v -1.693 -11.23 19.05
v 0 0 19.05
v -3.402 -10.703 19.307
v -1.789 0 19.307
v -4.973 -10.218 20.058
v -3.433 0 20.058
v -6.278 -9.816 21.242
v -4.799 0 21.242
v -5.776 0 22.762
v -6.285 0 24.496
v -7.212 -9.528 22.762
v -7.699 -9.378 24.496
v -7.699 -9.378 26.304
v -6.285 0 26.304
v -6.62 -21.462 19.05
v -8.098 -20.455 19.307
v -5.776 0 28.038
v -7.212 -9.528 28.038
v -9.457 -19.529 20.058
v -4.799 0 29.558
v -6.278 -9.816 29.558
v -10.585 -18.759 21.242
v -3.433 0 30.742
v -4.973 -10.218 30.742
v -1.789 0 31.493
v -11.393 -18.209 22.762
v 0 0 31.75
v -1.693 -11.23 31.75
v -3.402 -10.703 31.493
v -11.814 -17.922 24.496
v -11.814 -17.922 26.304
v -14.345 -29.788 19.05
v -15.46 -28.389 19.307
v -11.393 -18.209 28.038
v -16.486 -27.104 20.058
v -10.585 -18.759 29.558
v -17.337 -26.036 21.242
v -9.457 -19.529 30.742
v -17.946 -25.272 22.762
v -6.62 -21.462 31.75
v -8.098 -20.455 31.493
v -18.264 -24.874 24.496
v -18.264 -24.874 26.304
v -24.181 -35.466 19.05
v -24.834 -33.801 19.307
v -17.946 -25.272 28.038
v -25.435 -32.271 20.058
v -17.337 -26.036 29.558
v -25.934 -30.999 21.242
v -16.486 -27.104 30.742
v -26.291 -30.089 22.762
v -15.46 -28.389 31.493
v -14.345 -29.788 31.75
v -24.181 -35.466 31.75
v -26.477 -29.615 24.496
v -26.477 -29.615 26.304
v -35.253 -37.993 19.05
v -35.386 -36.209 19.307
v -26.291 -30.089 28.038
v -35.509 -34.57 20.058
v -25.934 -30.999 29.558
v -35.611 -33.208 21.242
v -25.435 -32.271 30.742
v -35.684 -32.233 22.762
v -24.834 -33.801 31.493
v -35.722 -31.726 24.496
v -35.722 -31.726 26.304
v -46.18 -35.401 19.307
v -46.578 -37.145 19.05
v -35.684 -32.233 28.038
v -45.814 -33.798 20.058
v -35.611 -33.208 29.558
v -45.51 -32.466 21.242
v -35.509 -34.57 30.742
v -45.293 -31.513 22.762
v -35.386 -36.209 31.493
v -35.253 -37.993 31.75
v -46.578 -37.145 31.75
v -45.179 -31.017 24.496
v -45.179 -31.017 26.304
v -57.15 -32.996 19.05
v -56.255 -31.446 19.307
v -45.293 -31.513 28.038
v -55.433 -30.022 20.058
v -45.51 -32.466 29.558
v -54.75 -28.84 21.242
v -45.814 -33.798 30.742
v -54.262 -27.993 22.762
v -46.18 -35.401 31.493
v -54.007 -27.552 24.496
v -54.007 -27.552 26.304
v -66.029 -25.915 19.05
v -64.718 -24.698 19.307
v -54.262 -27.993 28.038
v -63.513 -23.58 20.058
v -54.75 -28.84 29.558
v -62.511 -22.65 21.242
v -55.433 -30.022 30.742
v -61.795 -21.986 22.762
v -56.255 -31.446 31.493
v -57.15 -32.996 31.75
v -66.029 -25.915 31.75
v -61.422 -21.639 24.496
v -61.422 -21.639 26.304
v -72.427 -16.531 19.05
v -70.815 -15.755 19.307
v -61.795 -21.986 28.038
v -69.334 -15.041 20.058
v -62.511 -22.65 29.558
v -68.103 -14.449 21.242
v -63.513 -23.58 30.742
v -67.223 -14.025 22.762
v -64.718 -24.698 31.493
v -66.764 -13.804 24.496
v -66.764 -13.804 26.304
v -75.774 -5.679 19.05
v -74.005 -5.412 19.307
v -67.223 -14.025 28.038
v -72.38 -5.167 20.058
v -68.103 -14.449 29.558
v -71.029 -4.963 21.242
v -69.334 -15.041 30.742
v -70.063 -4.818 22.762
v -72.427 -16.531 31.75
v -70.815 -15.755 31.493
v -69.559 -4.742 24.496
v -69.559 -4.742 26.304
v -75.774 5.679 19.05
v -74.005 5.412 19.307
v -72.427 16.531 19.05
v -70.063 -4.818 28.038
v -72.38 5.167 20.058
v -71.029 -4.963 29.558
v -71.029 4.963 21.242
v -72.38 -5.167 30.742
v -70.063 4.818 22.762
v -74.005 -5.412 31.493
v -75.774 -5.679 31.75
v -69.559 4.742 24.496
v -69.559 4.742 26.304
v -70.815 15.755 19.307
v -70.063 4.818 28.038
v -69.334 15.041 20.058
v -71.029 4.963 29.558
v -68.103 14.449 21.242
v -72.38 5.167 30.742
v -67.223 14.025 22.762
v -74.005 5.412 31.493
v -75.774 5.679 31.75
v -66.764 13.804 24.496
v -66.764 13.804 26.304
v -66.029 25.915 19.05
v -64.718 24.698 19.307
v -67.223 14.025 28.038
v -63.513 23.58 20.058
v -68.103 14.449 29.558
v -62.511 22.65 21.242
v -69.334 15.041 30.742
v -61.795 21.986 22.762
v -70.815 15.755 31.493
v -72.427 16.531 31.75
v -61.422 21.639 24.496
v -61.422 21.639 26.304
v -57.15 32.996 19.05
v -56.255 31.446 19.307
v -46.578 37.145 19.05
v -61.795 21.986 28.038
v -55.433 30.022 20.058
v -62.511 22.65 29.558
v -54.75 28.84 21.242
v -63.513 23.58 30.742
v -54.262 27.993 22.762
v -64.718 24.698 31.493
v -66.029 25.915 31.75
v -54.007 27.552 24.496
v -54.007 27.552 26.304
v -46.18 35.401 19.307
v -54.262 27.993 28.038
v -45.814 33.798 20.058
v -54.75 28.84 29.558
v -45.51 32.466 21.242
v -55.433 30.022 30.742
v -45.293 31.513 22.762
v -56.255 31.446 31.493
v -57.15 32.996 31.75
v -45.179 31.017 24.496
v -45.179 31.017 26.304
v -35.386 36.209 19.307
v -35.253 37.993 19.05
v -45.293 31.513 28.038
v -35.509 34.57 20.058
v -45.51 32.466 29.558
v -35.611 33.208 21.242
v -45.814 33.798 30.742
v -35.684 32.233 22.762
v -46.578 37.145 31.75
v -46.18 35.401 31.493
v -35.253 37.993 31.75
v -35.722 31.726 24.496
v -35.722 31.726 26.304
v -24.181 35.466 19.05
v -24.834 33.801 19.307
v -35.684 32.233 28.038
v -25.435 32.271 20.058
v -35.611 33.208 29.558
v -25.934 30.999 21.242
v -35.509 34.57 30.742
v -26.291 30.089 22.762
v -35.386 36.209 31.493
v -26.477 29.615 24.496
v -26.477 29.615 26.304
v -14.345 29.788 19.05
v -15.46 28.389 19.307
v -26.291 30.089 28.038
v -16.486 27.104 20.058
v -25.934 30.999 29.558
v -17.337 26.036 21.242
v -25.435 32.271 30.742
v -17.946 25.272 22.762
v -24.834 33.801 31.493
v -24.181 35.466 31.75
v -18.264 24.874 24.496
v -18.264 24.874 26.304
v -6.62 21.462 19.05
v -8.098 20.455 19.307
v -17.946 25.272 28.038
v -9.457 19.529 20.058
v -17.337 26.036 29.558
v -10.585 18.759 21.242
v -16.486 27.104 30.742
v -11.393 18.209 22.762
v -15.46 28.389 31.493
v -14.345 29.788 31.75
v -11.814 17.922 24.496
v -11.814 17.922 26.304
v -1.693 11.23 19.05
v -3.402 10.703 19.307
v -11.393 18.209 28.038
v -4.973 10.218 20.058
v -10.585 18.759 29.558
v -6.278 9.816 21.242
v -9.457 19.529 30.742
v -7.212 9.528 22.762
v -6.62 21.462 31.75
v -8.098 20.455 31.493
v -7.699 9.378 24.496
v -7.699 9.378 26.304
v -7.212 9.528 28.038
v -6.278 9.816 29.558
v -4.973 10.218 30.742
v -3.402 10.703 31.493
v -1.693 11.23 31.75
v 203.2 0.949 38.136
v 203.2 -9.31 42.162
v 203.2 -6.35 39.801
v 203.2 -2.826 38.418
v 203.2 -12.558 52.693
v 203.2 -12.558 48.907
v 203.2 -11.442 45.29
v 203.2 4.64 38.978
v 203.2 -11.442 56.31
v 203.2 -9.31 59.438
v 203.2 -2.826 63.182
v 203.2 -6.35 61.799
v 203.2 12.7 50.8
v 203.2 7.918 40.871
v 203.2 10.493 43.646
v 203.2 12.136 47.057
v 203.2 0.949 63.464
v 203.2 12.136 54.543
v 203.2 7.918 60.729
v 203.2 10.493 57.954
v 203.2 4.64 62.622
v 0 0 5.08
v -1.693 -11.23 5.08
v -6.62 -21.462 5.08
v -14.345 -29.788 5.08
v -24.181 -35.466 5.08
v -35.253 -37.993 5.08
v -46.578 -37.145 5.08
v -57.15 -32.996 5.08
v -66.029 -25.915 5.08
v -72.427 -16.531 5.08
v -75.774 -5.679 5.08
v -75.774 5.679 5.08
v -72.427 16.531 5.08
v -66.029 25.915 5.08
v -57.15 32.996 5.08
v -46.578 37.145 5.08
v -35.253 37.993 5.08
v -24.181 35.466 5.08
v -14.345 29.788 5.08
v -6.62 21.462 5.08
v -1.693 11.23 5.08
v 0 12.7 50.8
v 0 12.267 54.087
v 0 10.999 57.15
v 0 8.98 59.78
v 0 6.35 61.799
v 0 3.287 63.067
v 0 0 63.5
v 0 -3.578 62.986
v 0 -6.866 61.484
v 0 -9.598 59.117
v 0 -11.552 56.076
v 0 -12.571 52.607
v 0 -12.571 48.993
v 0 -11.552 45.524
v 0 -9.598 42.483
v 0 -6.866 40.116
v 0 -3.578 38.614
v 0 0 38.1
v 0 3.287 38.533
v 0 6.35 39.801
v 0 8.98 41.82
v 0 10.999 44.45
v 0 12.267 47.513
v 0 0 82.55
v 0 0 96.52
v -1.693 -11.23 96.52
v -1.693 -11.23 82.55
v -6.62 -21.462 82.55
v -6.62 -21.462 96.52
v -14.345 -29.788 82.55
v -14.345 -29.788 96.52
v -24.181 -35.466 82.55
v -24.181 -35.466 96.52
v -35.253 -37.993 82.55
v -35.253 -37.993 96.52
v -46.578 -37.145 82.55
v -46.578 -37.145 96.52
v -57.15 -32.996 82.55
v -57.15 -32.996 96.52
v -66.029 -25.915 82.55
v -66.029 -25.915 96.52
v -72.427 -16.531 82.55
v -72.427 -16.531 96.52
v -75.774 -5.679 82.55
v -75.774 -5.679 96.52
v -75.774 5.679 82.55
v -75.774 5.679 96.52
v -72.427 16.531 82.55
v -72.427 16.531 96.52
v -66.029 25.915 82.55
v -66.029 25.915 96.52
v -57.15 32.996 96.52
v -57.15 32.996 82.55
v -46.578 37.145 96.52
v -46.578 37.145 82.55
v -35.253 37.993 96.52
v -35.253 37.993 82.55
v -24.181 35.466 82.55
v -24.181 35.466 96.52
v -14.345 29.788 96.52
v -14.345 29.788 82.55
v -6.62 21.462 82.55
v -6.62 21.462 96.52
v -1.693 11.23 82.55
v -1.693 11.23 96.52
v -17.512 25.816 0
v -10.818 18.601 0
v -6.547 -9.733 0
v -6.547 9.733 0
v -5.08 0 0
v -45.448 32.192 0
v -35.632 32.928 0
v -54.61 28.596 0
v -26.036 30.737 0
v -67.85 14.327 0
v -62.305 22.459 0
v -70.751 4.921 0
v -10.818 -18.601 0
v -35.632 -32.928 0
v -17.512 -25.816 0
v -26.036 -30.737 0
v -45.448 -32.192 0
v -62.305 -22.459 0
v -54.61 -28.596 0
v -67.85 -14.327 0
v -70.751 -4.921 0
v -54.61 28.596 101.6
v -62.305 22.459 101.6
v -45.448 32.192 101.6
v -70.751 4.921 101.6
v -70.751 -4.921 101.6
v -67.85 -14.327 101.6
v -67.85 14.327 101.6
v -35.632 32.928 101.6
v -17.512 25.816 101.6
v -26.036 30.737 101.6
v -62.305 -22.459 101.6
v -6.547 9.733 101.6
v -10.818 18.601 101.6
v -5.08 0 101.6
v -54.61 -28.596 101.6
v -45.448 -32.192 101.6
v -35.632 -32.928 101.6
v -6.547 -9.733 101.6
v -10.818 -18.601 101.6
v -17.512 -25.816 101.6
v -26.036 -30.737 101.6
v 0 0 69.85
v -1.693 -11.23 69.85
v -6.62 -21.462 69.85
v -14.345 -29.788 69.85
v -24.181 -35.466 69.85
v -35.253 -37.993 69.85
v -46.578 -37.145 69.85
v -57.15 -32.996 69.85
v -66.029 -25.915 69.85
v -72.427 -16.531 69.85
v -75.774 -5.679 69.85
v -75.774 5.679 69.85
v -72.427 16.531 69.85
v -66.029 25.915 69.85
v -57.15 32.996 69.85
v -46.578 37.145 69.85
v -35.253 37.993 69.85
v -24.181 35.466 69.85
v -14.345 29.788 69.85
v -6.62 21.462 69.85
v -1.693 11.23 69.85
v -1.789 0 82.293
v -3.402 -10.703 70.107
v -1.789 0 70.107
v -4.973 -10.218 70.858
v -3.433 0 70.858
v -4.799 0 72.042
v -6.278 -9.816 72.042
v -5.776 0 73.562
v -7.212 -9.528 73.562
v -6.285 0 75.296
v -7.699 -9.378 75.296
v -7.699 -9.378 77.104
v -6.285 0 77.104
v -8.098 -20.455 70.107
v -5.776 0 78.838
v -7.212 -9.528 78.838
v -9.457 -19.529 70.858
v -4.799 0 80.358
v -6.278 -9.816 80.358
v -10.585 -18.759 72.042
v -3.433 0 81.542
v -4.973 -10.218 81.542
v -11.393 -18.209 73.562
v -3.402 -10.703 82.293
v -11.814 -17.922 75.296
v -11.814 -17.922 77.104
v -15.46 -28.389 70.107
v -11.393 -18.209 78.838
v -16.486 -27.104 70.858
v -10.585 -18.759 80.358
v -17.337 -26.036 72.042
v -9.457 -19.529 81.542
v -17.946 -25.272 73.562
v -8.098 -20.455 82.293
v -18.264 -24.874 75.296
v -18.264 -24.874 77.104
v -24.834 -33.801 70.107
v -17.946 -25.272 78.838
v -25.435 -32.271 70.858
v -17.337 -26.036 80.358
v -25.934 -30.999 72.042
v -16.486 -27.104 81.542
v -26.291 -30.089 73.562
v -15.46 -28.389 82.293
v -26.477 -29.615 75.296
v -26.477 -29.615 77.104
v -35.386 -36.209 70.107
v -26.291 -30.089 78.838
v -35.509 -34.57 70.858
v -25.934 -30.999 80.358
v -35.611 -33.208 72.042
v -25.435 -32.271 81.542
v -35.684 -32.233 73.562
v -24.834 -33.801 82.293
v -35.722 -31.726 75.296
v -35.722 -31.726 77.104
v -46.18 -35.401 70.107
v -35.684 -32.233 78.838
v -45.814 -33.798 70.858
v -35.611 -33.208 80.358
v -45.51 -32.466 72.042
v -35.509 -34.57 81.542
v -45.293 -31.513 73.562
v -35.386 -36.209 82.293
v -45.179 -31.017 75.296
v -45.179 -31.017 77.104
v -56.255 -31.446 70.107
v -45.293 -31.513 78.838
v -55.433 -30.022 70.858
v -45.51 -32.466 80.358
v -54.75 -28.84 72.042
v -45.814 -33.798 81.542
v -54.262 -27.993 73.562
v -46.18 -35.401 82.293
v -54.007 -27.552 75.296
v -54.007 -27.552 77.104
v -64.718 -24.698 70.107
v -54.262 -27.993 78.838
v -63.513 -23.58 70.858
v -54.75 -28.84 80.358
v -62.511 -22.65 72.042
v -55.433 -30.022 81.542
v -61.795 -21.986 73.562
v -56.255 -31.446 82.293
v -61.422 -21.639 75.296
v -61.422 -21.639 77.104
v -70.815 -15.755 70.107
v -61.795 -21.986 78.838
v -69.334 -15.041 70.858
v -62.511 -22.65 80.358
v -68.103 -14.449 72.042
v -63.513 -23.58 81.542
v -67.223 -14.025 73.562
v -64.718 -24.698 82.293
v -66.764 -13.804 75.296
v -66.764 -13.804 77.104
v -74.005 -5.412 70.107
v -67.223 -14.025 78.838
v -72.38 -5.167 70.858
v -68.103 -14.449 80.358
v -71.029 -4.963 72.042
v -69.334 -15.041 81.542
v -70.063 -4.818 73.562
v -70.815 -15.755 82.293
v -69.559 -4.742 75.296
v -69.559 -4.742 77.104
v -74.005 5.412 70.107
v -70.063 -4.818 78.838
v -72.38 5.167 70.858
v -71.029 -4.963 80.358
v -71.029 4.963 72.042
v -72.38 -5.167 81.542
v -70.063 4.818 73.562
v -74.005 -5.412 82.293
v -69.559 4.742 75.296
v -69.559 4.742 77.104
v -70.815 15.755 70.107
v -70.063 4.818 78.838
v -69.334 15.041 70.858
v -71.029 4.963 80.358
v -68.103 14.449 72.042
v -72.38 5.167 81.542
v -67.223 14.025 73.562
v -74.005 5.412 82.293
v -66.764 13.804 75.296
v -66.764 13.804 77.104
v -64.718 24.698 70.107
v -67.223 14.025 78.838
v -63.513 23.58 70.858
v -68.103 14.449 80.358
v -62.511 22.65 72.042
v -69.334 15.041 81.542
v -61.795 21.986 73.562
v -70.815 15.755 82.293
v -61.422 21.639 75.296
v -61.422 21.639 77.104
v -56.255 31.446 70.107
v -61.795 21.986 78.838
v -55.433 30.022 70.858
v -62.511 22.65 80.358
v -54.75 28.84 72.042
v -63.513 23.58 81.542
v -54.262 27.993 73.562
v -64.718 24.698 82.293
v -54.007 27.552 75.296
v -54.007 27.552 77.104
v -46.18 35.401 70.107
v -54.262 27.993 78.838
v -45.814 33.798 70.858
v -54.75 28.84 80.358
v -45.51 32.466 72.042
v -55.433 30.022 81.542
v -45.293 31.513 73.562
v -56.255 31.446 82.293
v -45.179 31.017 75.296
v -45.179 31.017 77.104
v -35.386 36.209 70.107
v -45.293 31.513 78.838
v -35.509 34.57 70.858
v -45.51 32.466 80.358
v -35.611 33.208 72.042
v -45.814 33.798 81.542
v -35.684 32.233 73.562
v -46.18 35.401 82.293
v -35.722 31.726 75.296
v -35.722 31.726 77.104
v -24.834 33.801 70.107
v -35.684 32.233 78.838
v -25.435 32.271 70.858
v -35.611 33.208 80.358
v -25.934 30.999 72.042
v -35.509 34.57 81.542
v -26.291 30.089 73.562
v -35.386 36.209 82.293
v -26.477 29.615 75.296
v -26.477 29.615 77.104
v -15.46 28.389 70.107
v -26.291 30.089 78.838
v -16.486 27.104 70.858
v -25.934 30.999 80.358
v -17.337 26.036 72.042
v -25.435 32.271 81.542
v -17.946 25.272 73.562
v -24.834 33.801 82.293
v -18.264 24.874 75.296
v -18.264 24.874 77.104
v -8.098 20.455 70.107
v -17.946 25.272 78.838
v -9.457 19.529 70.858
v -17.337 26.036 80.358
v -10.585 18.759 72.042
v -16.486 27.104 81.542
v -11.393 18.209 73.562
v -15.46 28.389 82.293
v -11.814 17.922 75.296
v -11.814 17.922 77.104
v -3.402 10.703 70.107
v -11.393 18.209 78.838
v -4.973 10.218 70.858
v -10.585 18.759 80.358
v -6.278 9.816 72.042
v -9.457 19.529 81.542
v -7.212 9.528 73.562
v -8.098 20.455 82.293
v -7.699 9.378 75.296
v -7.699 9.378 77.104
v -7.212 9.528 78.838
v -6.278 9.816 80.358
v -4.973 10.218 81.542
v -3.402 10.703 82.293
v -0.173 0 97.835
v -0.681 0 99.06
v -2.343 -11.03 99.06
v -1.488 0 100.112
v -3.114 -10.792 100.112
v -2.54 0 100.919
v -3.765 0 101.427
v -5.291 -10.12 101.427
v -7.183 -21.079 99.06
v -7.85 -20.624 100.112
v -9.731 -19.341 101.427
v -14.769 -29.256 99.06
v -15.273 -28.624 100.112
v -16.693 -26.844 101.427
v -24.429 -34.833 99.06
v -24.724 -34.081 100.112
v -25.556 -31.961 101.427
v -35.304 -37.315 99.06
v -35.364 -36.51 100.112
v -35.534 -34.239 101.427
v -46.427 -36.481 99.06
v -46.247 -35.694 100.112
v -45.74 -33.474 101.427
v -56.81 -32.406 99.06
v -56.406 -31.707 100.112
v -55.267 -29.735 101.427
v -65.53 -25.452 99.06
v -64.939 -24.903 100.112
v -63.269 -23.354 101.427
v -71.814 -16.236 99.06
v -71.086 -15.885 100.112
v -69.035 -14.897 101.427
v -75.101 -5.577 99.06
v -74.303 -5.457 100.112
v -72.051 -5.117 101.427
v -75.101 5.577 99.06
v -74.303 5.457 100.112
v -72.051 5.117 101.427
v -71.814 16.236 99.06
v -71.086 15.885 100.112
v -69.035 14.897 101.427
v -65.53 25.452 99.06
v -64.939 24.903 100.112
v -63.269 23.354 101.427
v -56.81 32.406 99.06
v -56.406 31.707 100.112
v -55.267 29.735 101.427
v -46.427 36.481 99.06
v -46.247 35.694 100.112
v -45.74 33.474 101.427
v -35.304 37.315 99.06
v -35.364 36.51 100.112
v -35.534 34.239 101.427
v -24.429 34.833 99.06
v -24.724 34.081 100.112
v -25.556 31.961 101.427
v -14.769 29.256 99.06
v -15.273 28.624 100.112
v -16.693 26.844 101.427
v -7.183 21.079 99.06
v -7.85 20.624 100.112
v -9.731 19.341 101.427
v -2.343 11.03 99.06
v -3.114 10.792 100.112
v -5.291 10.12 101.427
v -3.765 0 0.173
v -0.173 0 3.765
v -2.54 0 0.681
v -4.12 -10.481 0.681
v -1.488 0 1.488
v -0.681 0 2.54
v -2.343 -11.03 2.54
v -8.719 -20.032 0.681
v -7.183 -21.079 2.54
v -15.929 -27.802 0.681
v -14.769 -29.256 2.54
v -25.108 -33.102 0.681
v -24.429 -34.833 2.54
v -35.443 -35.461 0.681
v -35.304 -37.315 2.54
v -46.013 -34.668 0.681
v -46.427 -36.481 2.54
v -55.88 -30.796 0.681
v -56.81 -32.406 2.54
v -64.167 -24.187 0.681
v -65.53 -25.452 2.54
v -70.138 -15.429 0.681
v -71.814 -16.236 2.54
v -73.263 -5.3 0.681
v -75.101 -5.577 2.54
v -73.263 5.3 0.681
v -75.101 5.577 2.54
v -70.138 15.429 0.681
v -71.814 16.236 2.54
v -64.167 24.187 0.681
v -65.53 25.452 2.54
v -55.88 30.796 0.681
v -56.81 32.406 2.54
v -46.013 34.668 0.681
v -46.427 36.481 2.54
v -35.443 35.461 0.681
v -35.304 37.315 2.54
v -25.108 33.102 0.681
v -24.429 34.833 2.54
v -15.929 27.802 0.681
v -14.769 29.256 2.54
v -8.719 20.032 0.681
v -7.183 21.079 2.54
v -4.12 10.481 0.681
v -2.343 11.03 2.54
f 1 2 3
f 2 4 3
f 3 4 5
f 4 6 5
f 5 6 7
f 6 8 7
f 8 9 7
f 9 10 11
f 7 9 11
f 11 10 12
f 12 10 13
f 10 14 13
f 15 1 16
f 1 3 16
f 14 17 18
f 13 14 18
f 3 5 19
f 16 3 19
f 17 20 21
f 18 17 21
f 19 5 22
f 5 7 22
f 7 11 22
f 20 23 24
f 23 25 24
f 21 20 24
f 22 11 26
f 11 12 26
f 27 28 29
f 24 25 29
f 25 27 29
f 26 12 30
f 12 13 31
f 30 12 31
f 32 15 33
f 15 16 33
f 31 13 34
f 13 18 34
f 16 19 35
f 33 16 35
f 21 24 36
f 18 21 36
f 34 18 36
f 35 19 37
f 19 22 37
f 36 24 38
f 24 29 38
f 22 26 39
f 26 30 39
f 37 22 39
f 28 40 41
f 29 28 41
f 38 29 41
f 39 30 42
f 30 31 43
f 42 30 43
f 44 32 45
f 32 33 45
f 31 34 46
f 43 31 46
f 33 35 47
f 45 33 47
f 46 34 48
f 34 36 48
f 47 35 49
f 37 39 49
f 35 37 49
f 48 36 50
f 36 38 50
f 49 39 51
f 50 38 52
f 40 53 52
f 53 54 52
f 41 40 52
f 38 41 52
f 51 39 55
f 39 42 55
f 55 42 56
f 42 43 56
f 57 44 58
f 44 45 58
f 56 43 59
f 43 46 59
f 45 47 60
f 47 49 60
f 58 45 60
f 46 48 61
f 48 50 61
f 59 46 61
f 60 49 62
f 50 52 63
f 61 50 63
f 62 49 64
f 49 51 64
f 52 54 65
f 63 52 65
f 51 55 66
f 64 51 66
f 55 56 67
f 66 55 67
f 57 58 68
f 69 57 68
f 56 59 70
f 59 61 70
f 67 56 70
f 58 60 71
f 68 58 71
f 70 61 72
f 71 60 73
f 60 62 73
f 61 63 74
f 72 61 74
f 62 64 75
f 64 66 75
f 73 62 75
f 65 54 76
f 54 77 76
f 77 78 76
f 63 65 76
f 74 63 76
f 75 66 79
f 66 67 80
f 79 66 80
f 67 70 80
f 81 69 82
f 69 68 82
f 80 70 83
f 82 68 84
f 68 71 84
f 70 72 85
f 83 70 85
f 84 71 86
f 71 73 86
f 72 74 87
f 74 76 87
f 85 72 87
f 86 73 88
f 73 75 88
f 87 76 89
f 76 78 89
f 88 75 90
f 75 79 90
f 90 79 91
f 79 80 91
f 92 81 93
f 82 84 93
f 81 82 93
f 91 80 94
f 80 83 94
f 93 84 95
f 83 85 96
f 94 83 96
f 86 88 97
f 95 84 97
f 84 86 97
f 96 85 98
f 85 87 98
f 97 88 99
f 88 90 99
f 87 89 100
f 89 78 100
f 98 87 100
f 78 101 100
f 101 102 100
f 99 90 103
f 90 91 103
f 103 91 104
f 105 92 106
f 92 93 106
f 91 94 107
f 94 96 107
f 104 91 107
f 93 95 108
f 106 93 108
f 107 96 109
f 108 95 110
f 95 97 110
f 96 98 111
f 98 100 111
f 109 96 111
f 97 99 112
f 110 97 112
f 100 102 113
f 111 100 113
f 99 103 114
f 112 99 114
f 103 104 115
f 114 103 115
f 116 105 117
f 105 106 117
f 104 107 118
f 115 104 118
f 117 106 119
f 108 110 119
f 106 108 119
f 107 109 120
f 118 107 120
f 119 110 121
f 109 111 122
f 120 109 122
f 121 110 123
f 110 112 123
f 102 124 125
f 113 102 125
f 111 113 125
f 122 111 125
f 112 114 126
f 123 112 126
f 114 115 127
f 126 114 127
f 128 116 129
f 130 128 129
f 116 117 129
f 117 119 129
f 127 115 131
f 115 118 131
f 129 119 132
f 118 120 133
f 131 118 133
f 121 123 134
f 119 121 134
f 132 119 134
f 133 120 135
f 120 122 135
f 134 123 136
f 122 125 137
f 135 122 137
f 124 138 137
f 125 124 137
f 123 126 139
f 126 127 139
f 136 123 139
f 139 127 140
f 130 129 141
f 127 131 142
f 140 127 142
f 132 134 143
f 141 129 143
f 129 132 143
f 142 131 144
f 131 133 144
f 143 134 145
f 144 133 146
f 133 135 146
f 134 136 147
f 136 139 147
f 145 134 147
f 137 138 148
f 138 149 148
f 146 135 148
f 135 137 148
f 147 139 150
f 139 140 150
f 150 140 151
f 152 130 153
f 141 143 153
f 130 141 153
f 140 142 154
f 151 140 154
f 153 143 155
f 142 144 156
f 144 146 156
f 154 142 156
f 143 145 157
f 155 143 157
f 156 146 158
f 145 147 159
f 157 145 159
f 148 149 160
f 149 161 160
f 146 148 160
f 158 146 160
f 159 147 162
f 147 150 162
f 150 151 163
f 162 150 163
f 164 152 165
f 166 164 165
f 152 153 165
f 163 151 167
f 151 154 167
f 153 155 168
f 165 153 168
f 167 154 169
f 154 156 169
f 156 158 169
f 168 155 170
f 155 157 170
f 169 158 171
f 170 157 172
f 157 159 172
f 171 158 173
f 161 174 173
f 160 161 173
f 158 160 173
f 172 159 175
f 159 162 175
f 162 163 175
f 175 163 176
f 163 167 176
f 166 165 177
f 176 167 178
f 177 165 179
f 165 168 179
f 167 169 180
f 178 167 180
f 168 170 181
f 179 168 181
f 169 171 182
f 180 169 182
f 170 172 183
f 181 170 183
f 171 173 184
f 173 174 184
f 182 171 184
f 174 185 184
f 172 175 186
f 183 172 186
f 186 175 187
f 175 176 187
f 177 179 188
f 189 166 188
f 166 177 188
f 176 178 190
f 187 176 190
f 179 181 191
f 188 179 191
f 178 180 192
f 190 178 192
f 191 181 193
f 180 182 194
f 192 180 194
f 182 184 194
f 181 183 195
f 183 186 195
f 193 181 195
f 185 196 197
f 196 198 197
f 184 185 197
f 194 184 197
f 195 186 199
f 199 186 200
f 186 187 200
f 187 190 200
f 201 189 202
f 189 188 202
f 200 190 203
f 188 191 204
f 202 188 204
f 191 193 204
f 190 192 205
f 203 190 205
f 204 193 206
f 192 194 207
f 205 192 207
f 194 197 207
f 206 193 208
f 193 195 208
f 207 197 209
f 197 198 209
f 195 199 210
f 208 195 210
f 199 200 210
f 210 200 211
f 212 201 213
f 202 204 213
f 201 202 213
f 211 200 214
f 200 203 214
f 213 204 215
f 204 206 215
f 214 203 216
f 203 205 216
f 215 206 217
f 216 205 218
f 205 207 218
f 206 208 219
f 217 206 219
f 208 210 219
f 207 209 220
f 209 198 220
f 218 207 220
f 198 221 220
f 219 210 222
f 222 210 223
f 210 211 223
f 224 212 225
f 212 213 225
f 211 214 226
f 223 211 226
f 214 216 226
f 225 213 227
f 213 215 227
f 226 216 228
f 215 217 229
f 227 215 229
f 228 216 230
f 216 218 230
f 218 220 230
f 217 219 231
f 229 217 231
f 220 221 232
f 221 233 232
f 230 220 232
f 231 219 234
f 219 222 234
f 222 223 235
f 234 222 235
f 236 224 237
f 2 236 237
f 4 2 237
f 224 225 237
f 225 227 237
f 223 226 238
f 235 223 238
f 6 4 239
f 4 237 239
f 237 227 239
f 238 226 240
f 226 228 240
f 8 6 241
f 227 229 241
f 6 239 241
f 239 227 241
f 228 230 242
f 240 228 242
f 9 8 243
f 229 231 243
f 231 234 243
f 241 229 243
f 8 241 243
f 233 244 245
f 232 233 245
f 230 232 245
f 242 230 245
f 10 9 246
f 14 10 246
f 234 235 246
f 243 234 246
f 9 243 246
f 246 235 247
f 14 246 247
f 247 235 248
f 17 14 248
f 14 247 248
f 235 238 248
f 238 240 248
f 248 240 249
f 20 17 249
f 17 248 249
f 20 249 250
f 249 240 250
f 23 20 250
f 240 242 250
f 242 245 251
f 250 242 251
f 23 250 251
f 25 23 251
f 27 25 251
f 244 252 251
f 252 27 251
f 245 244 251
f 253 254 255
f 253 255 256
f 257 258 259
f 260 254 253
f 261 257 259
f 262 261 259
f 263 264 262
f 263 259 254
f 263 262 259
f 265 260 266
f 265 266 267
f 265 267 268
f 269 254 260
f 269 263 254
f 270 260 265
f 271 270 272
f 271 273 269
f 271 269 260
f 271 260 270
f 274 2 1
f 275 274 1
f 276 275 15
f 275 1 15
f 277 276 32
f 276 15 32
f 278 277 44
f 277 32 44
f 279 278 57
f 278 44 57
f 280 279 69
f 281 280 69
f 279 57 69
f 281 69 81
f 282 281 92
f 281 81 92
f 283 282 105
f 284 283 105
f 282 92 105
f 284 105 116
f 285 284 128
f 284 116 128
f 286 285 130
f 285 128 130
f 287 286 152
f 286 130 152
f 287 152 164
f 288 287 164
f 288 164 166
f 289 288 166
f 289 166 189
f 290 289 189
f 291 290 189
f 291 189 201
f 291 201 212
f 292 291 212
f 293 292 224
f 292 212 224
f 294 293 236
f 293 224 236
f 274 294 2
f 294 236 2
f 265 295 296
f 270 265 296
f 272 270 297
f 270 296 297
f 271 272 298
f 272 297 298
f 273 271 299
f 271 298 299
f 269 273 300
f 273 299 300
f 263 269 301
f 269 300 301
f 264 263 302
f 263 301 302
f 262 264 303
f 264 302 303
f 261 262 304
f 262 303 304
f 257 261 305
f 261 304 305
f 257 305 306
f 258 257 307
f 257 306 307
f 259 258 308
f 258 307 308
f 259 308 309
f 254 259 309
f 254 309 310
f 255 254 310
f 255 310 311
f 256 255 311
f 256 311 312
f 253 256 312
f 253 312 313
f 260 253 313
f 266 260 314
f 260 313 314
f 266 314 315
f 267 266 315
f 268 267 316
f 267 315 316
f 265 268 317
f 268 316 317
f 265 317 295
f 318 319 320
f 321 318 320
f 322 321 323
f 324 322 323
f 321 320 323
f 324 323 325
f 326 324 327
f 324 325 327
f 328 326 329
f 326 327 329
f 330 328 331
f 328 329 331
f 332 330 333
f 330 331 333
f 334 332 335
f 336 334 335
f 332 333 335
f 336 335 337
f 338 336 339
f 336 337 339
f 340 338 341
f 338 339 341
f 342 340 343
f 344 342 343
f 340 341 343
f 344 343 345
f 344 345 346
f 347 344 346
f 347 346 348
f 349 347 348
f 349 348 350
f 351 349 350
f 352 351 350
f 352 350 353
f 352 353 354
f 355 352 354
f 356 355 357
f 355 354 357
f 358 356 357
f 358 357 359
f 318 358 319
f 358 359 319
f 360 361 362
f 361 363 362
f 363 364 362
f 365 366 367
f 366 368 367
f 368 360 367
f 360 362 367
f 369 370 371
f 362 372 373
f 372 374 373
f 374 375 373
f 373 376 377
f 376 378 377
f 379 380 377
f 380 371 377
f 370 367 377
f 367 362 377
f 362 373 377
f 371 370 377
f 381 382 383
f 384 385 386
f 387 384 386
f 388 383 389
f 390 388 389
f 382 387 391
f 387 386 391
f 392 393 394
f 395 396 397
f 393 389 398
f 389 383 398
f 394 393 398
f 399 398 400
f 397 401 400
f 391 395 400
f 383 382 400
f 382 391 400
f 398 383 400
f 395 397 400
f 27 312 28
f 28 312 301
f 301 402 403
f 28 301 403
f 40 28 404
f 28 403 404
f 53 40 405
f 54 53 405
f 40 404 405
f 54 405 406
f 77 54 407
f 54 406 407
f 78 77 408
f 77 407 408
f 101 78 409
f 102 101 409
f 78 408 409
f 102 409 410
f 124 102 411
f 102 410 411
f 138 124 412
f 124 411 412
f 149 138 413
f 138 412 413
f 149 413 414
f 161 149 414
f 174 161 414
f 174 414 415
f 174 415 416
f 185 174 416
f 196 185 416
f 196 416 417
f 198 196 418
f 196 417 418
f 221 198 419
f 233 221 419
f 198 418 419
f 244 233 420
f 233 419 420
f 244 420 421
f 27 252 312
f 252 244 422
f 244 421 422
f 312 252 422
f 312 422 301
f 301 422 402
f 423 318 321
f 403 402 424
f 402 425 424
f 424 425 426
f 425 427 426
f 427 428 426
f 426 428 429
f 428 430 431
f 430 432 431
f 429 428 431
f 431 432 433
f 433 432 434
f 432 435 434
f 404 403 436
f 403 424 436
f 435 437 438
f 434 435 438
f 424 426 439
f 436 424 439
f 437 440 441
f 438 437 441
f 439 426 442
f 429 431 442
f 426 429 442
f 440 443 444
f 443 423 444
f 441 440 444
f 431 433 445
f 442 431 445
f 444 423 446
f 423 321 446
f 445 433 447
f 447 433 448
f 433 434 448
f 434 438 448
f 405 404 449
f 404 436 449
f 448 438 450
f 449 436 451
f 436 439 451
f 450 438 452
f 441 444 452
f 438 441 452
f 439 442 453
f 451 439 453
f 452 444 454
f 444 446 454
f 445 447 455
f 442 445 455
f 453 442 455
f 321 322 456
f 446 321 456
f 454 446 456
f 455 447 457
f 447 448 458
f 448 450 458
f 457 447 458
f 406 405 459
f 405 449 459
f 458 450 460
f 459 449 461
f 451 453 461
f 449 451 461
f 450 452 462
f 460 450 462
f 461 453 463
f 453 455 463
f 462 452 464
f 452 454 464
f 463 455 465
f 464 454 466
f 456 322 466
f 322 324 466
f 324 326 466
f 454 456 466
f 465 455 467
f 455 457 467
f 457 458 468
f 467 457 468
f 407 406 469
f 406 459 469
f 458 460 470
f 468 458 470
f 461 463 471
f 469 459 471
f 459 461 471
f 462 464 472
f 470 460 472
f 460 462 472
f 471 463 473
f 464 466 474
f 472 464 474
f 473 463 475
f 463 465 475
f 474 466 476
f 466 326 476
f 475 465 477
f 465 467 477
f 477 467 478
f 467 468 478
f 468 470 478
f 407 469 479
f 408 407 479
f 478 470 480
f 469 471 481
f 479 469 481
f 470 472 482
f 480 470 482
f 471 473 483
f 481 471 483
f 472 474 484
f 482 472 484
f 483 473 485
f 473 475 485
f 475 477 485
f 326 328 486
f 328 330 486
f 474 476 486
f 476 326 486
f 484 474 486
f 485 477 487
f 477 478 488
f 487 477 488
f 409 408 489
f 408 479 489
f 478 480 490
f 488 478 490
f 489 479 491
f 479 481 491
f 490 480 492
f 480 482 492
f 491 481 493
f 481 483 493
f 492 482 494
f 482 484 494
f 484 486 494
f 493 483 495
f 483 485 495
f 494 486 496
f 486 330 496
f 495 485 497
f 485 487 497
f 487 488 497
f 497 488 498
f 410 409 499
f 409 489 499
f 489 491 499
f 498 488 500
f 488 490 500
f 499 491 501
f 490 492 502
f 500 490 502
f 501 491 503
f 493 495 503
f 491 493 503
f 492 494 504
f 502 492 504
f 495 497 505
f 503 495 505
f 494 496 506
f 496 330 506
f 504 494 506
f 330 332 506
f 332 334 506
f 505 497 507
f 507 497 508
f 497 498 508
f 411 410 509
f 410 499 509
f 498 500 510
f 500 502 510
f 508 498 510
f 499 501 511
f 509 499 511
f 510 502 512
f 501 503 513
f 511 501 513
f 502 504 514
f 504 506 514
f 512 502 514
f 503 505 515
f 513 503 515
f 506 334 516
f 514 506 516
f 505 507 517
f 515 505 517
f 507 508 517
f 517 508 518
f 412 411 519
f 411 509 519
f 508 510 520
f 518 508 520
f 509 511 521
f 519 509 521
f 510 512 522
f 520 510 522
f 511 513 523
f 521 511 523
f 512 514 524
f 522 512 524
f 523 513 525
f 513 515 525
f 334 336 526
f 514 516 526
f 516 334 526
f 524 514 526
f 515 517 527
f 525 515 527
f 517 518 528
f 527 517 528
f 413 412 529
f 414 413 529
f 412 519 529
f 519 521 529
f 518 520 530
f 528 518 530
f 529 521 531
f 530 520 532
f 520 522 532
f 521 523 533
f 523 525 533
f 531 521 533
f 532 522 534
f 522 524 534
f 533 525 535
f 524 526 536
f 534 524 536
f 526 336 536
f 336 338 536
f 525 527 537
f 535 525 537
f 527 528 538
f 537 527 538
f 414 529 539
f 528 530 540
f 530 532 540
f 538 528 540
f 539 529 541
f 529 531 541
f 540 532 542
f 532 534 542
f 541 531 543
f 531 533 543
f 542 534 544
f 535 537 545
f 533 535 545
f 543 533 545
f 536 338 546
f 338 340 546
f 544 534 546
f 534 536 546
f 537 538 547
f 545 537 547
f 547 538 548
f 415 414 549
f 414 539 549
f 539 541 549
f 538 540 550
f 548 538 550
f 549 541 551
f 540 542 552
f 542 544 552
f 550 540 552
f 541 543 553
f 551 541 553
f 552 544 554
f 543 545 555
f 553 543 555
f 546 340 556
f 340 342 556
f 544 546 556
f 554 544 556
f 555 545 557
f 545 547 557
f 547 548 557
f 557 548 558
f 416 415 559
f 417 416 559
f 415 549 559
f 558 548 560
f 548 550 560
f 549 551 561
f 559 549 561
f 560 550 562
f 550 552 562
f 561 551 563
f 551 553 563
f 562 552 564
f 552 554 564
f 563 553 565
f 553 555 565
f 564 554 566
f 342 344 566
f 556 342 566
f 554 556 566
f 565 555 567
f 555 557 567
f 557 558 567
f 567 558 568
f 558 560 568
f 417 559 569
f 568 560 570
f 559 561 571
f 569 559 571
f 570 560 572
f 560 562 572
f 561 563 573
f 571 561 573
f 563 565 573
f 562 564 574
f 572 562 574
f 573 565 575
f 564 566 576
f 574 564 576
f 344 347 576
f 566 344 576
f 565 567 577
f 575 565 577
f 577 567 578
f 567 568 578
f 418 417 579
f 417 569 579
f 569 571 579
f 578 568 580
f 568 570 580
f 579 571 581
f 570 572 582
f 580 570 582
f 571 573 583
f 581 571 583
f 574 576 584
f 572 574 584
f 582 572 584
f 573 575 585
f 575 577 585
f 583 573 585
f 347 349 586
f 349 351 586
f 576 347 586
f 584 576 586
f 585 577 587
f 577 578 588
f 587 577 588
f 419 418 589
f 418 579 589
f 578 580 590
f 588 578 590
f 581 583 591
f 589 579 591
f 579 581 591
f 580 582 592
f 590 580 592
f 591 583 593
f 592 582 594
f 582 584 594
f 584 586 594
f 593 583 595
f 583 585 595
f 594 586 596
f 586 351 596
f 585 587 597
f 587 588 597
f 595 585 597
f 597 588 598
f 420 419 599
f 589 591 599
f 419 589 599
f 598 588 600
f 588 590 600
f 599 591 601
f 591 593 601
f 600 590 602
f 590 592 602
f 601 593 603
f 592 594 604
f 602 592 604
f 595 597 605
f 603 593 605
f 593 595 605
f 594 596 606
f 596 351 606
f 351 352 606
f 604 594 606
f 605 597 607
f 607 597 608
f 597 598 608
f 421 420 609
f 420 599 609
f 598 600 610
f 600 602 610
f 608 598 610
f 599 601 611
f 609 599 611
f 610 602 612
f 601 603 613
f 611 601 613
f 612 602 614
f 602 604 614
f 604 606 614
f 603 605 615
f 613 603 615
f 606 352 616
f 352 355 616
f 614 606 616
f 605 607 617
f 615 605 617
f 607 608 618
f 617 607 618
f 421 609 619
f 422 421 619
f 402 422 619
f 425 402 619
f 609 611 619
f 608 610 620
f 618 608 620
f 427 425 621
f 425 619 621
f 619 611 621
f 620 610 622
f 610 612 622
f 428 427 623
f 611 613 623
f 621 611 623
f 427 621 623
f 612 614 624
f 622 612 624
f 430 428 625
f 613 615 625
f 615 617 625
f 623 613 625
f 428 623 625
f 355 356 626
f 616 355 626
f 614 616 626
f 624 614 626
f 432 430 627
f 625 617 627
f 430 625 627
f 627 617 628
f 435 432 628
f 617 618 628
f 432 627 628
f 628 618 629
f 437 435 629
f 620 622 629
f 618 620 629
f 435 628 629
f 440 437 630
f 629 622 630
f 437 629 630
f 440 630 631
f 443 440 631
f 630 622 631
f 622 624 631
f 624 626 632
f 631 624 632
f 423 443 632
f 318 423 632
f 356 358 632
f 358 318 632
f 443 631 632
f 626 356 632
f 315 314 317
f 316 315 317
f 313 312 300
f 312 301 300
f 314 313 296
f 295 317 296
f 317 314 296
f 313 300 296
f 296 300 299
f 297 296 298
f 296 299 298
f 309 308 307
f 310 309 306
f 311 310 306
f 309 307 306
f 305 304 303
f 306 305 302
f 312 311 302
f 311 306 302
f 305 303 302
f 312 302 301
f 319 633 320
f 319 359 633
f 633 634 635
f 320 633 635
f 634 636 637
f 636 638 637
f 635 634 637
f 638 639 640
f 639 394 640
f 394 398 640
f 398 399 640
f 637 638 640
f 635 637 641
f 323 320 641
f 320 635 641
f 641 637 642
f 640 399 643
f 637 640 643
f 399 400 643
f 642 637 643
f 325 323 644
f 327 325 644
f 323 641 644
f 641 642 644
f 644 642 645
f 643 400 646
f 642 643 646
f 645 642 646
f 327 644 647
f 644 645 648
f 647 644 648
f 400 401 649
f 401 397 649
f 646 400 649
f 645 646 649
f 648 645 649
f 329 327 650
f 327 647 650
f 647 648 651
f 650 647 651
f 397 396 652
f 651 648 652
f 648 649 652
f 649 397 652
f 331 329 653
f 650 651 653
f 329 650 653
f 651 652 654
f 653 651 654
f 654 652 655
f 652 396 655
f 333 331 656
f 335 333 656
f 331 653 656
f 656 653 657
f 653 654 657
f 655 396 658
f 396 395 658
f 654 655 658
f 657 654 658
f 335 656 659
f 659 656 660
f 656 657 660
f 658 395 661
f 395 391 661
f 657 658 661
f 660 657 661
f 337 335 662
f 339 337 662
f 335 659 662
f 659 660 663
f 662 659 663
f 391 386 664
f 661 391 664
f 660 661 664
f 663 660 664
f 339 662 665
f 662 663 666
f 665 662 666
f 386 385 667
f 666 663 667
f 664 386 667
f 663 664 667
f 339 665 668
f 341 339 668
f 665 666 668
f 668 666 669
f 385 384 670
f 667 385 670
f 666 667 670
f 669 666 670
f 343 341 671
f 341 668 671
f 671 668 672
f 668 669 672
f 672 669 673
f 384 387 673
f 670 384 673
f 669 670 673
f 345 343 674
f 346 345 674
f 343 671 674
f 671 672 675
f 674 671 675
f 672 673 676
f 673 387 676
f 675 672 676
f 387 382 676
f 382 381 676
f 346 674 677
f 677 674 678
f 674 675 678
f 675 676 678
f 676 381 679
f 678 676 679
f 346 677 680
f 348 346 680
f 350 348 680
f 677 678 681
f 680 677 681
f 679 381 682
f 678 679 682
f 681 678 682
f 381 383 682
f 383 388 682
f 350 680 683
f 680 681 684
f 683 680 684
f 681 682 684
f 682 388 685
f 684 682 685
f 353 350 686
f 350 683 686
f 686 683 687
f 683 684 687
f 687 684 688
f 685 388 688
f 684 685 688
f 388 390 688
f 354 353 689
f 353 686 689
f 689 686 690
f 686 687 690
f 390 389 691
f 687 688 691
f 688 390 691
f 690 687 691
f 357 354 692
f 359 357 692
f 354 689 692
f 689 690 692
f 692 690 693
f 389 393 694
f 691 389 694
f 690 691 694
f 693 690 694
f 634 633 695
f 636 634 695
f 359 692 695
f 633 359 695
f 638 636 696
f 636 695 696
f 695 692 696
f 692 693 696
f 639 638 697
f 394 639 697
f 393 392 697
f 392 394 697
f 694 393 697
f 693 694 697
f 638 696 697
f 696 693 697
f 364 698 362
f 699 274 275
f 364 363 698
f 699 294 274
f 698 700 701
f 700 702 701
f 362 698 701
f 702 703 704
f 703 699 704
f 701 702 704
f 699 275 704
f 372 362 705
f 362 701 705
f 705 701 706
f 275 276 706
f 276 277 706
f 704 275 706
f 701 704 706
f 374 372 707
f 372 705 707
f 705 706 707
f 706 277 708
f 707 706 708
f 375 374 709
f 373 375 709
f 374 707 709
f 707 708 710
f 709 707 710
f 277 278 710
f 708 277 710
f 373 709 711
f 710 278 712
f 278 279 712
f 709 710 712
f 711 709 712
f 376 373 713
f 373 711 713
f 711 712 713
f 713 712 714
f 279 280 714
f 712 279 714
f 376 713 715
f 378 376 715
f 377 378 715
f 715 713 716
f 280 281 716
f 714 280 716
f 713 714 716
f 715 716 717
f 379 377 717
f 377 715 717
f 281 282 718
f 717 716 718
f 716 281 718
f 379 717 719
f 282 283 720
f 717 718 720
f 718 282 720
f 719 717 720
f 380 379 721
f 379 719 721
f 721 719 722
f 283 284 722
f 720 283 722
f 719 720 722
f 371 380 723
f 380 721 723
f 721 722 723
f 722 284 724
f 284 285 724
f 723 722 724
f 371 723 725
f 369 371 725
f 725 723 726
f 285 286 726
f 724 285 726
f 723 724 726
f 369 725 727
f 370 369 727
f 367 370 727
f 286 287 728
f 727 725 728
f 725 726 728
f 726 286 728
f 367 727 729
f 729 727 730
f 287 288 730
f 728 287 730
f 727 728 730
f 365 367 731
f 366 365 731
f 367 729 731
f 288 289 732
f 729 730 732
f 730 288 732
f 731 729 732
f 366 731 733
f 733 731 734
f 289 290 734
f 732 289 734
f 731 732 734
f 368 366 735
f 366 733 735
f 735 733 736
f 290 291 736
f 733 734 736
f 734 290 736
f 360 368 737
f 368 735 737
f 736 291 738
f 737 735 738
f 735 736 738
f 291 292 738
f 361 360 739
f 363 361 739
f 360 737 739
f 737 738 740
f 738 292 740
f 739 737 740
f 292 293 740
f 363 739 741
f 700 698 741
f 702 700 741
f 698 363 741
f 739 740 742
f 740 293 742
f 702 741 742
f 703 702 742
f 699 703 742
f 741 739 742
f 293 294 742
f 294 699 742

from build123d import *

# Parameters (mm, degrees)
F2_R     = 5.08
F3_R     = 12.7
F4_DEPTH = 203.2


with BuildPart() as f1:
    # F0 (on Front) → F1 (revolve)
    with BuildSketch(Plane.XZ):
        with BuildLine():
            Line((-38.1, 0), (0, 0))
            Line((0, 0), (0, 19.05))
            ThreePointArc((0, 19.05), (-6.35, 25.4), (0, 31.75))
            Line((0, 31.75), (0, 69.85))
            ThreePointArc((0, 69.85), (-6.35, 76.2), (0, 82.55))
            Line((0, 82.55), (0, 101.6))
            Line((0, 101.6), (-38.1, 101.6))
            Line((-38.1, 101.6), (-38.1, 0))
        make_face()
    revolve(axis=Axis((-38.1, 0, 50.8), (0, 0, -1)))

    # F2
    f2_edges = [f1.edges().sort_by_distance(p)[0] for p in [
        (-76.2, 0, 101.6),
        (-76.2, 0, 0),
    ]]
    fillet(f2_edges, radius=F2_R)

    # F3 (on Right) → F4 (join)
    with BuildSketch(Plane.YZ):
        with Locations((0, 50.8)):
            Circle(F3_R)
    extrude(amount=F4_DEPTH)


solid = f1.part
